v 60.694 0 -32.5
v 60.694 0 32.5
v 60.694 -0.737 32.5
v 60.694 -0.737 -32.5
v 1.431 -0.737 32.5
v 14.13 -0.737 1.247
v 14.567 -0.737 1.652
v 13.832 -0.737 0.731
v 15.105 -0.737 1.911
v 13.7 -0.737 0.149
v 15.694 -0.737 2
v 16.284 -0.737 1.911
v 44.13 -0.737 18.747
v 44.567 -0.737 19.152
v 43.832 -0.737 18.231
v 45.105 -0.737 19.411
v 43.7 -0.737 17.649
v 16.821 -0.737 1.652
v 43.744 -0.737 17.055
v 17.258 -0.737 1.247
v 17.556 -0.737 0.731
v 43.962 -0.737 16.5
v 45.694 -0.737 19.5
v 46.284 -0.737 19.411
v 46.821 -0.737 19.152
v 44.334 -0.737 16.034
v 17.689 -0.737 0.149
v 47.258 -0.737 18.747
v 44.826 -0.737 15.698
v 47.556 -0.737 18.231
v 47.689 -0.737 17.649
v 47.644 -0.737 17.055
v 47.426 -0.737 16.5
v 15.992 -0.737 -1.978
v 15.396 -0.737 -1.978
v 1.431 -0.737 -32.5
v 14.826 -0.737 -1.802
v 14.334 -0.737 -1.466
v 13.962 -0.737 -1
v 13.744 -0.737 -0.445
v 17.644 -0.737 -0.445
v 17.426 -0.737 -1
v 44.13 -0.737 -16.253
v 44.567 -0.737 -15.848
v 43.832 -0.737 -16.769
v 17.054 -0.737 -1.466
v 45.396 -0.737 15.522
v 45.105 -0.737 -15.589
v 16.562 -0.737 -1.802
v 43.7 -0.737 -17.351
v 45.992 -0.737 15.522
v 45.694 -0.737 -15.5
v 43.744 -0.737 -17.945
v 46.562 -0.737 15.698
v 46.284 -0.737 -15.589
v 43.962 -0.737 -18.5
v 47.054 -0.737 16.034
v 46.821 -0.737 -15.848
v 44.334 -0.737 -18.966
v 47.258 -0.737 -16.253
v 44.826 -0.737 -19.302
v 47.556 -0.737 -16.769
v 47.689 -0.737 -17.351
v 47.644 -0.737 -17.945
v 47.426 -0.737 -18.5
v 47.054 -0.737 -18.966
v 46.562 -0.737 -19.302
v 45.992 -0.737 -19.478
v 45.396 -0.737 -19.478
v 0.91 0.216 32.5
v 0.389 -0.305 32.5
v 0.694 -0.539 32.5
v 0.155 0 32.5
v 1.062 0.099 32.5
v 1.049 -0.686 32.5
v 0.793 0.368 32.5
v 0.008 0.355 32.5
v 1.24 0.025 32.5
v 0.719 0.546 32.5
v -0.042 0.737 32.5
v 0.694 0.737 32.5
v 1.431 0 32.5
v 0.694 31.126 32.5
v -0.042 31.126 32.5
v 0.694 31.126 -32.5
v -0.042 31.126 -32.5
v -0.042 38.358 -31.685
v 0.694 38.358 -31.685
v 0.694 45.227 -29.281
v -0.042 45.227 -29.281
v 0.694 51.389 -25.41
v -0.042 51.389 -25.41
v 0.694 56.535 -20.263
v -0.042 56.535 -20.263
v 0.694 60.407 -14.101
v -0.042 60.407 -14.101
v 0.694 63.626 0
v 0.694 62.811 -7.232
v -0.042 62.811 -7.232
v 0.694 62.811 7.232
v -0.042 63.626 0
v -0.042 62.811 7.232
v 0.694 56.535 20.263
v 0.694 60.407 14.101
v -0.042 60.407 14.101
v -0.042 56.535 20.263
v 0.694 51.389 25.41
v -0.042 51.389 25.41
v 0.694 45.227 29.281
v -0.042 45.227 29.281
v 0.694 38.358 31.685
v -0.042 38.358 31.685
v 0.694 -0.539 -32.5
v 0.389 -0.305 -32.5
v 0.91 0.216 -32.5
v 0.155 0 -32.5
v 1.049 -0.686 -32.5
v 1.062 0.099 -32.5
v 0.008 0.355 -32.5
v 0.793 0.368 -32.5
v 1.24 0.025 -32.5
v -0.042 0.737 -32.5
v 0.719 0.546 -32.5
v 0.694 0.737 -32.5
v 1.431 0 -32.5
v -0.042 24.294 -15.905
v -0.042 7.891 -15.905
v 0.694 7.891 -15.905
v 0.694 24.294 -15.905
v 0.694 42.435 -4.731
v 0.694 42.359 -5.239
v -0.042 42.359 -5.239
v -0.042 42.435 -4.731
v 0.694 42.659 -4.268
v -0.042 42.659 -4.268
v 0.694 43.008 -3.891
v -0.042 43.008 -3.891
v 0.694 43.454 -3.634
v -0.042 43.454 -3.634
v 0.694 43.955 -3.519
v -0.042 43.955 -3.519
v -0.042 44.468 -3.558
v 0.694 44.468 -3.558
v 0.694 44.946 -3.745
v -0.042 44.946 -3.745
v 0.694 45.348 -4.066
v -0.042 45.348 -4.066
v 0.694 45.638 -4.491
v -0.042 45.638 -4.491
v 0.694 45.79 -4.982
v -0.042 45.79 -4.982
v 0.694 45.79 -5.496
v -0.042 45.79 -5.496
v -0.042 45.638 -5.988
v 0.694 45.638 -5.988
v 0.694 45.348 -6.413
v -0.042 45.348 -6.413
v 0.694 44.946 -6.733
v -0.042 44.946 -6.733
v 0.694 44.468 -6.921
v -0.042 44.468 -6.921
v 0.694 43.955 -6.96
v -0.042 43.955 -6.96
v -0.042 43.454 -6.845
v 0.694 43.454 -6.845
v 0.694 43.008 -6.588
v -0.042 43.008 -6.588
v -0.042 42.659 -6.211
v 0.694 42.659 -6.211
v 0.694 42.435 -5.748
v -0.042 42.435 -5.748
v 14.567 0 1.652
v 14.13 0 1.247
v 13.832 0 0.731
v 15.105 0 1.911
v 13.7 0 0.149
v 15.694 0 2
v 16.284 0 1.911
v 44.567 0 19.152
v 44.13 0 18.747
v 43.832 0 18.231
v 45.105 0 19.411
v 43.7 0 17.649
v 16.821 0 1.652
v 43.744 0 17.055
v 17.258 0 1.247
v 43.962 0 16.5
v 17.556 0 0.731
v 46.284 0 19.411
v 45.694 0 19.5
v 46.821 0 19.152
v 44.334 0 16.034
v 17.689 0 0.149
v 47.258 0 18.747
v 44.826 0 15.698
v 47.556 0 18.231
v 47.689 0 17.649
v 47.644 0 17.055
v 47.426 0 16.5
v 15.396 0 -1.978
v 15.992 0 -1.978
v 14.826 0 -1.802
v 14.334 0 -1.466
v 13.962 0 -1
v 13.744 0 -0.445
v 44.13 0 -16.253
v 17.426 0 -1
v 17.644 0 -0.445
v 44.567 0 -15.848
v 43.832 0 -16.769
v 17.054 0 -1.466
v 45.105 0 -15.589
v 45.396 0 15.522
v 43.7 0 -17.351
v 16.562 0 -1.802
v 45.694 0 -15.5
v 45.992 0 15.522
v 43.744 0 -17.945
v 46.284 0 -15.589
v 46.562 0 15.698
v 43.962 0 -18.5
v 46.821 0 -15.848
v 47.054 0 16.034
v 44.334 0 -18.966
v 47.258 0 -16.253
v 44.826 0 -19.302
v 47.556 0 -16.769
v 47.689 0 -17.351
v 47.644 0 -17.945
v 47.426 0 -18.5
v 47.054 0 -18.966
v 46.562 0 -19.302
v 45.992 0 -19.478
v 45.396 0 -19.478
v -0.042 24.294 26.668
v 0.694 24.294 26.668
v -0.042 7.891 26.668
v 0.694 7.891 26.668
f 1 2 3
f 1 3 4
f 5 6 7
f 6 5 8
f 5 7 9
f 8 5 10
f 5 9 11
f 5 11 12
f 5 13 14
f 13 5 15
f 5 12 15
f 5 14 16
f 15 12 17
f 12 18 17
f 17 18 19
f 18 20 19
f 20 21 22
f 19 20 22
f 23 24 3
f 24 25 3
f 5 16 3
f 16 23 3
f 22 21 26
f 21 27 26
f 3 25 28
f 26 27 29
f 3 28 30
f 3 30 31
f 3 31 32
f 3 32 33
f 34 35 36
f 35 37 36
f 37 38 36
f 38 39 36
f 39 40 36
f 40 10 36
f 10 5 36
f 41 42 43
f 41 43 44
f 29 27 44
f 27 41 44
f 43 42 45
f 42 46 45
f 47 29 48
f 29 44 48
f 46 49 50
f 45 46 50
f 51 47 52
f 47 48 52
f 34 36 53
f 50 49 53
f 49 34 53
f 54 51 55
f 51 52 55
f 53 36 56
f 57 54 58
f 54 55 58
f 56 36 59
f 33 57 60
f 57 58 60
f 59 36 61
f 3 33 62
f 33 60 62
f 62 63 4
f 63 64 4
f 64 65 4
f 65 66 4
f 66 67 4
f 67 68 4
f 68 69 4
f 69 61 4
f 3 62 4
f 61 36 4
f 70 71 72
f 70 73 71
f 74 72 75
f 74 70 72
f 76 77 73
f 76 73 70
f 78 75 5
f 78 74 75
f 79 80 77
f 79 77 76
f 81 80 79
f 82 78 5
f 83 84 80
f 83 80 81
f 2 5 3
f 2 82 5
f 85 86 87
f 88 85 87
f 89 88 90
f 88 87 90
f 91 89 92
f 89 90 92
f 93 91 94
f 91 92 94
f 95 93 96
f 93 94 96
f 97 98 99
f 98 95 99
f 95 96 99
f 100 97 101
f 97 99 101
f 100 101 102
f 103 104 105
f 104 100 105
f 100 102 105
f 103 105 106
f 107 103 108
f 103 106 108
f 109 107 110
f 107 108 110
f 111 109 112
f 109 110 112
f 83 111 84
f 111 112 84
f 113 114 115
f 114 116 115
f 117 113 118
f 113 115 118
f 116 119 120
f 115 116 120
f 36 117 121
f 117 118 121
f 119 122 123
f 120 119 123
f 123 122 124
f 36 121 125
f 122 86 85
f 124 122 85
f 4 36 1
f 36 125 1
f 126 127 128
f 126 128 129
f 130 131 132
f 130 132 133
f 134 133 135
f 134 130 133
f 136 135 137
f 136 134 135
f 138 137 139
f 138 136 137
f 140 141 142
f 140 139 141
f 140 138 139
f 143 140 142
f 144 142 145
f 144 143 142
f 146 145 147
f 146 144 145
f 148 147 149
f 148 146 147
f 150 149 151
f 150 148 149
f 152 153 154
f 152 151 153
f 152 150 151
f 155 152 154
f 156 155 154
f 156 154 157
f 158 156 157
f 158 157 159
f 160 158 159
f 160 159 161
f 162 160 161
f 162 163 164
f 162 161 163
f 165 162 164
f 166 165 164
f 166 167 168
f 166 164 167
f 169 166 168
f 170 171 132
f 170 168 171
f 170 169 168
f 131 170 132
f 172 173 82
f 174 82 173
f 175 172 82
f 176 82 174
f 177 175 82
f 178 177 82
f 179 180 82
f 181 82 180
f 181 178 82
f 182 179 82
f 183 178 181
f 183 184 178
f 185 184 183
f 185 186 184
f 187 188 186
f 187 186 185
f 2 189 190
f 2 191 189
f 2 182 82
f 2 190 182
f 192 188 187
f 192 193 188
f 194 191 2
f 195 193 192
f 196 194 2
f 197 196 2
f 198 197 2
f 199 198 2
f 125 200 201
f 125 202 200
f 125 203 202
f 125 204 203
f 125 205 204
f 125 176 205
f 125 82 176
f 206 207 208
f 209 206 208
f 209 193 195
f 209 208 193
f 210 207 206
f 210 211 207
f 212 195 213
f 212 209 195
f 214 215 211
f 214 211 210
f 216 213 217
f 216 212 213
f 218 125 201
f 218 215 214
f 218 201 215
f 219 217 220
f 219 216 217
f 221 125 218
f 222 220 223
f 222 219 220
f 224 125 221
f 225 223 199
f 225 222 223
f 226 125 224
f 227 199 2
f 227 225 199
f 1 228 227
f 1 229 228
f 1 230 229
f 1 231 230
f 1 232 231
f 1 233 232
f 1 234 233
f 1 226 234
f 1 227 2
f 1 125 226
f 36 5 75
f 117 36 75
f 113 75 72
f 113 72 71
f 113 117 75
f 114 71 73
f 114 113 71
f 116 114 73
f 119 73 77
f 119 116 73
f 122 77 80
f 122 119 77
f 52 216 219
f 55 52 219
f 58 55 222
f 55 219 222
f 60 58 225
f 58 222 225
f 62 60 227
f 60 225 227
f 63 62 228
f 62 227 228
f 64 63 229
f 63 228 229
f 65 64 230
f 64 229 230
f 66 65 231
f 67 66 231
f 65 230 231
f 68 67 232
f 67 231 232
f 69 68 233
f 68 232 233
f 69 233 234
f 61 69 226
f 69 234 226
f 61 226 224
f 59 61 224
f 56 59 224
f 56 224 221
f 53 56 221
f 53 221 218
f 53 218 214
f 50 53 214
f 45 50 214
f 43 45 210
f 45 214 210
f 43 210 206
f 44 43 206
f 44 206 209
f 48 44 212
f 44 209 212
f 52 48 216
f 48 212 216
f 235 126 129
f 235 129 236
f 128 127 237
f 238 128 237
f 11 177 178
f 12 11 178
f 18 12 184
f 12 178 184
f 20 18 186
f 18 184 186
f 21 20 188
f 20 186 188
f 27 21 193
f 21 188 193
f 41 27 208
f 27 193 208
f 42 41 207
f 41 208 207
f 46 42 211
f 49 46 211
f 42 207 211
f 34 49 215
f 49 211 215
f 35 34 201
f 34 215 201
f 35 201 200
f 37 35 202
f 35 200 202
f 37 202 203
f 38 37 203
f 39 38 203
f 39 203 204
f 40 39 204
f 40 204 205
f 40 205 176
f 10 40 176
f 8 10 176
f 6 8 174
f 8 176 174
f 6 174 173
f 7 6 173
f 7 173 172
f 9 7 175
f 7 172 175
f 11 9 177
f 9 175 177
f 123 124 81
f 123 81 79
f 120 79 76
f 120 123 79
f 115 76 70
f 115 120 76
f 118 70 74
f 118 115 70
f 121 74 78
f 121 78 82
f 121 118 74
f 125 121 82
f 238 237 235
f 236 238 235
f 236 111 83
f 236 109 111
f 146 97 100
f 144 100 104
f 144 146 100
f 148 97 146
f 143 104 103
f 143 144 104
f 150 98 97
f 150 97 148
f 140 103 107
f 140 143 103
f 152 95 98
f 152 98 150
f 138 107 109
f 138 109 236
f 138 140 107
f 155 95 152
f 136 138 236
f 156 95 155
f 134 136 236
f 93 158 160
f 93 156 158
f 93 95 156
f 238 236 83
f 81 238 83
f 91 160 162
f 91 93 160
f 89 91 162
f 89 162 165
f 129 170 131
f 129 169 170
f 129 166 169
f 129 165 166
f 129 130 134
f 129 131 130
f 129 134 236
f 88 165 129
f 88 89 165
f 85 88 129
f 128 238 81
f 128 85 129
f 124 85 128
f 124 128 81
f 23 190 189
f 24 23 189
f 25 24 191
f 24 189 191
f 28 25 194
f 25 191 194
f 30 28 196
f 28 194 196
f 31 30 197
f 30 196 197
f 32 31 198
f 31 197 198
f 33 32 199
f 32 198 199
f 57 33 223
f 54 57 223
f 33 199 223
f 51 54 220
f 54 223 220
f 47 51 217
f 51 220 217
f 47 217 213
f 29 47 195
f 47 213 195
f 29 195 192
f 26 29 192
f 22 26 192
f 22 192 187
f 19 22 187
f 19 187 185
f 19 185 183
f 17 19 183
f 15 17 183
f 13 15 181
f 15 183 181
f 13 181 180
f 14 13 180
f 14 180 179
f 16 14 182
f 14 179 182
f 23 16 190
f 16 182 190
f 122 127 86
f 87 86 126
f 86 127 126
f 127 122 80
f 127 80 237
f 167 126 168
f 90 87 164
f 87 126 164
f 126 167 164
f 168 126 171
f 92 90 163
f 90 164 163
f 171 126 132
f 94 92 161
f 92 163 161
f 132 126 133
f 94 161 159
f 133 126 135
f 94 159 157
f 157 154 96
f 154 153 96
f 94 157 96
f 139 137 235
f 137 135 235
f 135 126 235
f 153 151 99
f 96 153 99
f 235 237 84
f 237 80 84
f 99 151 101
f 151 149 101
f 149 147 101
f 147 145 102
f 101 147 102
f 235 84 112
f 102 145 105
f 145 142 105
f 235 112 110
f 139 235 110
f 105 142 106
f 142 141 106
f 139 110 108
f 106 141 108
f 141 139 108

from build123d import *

# Parameters (mm, degrees)
SKETCH1_R                = 2
BASE_FLANGE3_DEPTH       = 0.7366
SKETCHED_START           = -64
SKETCHED_BEND1_OUTLINE_W = 0.7366
SKETCHED_BEND1_OUTLINE_H = 65
SKETCHED_BEND1_DEPTH     = 64.108877104
SKETCHED_START_2         = 0.168203781
SKETCHED_BEND1_2_DEPTH   = 0.525916755
SKETCHED_START_3         = -0.042479464
SKETCHED_BEND1_3_DEPTH   = 1.4732
SKETCHED_START_4         = -32.5
SKETCHED_BEND1_4_DEPTH   = 65
SKETCH28_W               = 42.572846016
SKETCH28_H               = 16.402646855
CUT_EXTRUDE8_DEPTH       = 83.088587536
CUT_EXTRUDE9_DEPTH       = 83.088587536
CUT_EXTRUDE9_DEPTH_BACK  = 83.088587536
SKETCH29_R               = 1.725
SKETCH30_W               = 30
SKETCH30_H               = 65
SKETCH30_R               = 2
TAB1_DEPTH               = 0.7366


with BuildPart() as part:
    # Base-Flange3: sheet metal written as solids
    # Sketch1 → Base-Flange3 (new body)
    with BuildSketch(Plane(origin=(0, 0, 0), x_dir=(1, 0, 0), z_dir=(0, 1, 0))):
        with BuildLine():
            Line((-30.694120536, 32.5), (30.694120536, 32.5))
            Line((30.694120536, 32.5), (30.694120536, -32.5))
            Line((30.694120536, -32.5), (-30.694120536, -32.5))
            ThreePointArc((-30.694120536, -32.5), (-63.194120536, 0), (-30.694120536, 32.5))
        make_face()
        with Locations(Location((15.694120536, 0, 0), (0, 0, 270))):
            Circle(SKETCH1_R, mode=Mode.SUBTRACT)
    extrude(amount=-BASE_FLANGE3_DEPTH)

    # Sketched Bend1: read off the stored shape, not the designer's step
    # Sketched Bend1 outline → Sketched Bend1 (cut)
    with BuildSketch(Plane.YZ.offset(SKETCHED_START)):
        with Locations((-0.3683, 0)):
            Rectangle(SKETCHED_BEND1_OUTLINE_W, SKETCHED_BEND1_OUTLINE_H)
    extrude(amount=SKETCHED_BEND1_DEPTH, mode=Mode.SUBTRACT)

    # Sketched Bend1 2 outline → Sketched Bend1 2 (add)
    with BuildSketch(Plane.YZ.offset(SKETCHED_START_2)):
        with BuildLine():
            ThreePointArc((31.12586821, -32.5), (63.62586821, 0), (31.12586821, 32.5))
            Line((31.12586821, 32.5), (0, 32.5))
            Line((0, 32.5), (0, -32.5))
            Line((0, -32.5), (31.12586821, -32.5))
        make_face()
    extrude(amount=SKETCHED_BEND1_2_DEPTH)

    # Sketched Bend1 3 outline → Sketched Bend1 3 (add)
    with BuildSketch(Plane.YZ.offset(SKETCHED_START_3)):
        with BuildLine():
            ThreePointArc((31.12586821, -32.5), (63.62586821, 0), (31.12586821, 32.5))
            Line((31.12586821, 32.5), (0, 32.5))
            Line((0, 32.5), (0, -32.5))
            Line((0, -32.5), (31.12586821, -32.5))
        make_face()
    extrude(amount=SKETCHED_BEND1_3_DEPTH)

    # Sketched Bend1 4 outline → Sketched Bend1 4 (cut)
    with BuildSketch(Plane.XY.offset(SKETCHED_START_4)):
        with BuildLine():
            Line((0.694120536, 65), (0.694120536, 0.7366))
            ThreePointArc((0.694120536, 0.7366), (0.90986568, 0.215745144), (1.430720536, 0))
            Line((1.430720536, 0), (1.430720536, 65))
            Line((1.430720536, 65), (0.694120536, 65))
        make_face()
        with BuildLine():
            Line((-0.042479464, 0.7366), (-0.042479396, 65))
            Line((-0.042479396, 65), (-2, 65))
            Line((-2, 65), (-2, 0))
            Line((-2, 0), (0.108877104, 0))
            Line((0.108877104, 0), (0.108877104, -2))
            Line((0.108877104, -2), (32, -2))
            Line((32, -2), (32, -0.736599968))
            Line((32, -0.736599968), (1.430720536, -0.7366))
            ThreePointArc((1.430720536, -0.7366), (0.389010825, -0.30510971), (-0.042479464, 0.7366))
        make_face()
    extrude(amount=SKETCHED_BEND1_4_DEPTH, mode=Mode.SUBTRACT)

    # Sketch28 → Cut-Extrude8 (cut, through all)
    with BuildSketch(Plane.ZY.offset(9.729079464)):
        with Locations((5.381444798, 16.092801871)):
            Rectangle(SKETCH28_W, SKETCH28_H)
    extrude(amount=-CUT_EXTRUDE8_DEPTH, mode=Mode.SUBTRACT)

    # Sketch29 → Cut-Extrude9 (cut, two sides: drawn at the far end of the back side and taken through both)
    with BuildSketch(Plane.ZY.offset(9.729079464).offset(-CUT_EXTRUDE9_DEPTH_BACK)):
        with Locations(Location((-5.239369246, 44.083803898, 0), (0, 0, 270))):
            Circle(SKETCH29_R)
    extrude(amount=CUT_EXTRUDE9_DEPTH + CUT_EXTRUDE9_DEPTH_BACK, mode=Mode.SUBTRACT)

    # Tab1: sheet metal written as solids
    # Sketch30 → Tab1 (add)
    with BuildSketch(Plane(origin=(0, 0, 0), x_dir=(1, 0, 0), z_dir=(0, 1, 0))):
        with Locations((45.694120536, 0)):
            Rectangle(SKETCH30_W, SKETCH30_H)
        with Locations(Location((45.694120536, -17.5, 0), (0, 0, 270))):
            Circle(SKETCH30_R, mode=Mode.SUBTRACT)
        with Locations(Location((45.694120536, 17.5, 0), (0, 0, 270))):
            Circle(SKETCH30_R, mode=Mode.SUBTRACT)
    extrude(amount=-TAB1_DEPTH)


solid = part.part
